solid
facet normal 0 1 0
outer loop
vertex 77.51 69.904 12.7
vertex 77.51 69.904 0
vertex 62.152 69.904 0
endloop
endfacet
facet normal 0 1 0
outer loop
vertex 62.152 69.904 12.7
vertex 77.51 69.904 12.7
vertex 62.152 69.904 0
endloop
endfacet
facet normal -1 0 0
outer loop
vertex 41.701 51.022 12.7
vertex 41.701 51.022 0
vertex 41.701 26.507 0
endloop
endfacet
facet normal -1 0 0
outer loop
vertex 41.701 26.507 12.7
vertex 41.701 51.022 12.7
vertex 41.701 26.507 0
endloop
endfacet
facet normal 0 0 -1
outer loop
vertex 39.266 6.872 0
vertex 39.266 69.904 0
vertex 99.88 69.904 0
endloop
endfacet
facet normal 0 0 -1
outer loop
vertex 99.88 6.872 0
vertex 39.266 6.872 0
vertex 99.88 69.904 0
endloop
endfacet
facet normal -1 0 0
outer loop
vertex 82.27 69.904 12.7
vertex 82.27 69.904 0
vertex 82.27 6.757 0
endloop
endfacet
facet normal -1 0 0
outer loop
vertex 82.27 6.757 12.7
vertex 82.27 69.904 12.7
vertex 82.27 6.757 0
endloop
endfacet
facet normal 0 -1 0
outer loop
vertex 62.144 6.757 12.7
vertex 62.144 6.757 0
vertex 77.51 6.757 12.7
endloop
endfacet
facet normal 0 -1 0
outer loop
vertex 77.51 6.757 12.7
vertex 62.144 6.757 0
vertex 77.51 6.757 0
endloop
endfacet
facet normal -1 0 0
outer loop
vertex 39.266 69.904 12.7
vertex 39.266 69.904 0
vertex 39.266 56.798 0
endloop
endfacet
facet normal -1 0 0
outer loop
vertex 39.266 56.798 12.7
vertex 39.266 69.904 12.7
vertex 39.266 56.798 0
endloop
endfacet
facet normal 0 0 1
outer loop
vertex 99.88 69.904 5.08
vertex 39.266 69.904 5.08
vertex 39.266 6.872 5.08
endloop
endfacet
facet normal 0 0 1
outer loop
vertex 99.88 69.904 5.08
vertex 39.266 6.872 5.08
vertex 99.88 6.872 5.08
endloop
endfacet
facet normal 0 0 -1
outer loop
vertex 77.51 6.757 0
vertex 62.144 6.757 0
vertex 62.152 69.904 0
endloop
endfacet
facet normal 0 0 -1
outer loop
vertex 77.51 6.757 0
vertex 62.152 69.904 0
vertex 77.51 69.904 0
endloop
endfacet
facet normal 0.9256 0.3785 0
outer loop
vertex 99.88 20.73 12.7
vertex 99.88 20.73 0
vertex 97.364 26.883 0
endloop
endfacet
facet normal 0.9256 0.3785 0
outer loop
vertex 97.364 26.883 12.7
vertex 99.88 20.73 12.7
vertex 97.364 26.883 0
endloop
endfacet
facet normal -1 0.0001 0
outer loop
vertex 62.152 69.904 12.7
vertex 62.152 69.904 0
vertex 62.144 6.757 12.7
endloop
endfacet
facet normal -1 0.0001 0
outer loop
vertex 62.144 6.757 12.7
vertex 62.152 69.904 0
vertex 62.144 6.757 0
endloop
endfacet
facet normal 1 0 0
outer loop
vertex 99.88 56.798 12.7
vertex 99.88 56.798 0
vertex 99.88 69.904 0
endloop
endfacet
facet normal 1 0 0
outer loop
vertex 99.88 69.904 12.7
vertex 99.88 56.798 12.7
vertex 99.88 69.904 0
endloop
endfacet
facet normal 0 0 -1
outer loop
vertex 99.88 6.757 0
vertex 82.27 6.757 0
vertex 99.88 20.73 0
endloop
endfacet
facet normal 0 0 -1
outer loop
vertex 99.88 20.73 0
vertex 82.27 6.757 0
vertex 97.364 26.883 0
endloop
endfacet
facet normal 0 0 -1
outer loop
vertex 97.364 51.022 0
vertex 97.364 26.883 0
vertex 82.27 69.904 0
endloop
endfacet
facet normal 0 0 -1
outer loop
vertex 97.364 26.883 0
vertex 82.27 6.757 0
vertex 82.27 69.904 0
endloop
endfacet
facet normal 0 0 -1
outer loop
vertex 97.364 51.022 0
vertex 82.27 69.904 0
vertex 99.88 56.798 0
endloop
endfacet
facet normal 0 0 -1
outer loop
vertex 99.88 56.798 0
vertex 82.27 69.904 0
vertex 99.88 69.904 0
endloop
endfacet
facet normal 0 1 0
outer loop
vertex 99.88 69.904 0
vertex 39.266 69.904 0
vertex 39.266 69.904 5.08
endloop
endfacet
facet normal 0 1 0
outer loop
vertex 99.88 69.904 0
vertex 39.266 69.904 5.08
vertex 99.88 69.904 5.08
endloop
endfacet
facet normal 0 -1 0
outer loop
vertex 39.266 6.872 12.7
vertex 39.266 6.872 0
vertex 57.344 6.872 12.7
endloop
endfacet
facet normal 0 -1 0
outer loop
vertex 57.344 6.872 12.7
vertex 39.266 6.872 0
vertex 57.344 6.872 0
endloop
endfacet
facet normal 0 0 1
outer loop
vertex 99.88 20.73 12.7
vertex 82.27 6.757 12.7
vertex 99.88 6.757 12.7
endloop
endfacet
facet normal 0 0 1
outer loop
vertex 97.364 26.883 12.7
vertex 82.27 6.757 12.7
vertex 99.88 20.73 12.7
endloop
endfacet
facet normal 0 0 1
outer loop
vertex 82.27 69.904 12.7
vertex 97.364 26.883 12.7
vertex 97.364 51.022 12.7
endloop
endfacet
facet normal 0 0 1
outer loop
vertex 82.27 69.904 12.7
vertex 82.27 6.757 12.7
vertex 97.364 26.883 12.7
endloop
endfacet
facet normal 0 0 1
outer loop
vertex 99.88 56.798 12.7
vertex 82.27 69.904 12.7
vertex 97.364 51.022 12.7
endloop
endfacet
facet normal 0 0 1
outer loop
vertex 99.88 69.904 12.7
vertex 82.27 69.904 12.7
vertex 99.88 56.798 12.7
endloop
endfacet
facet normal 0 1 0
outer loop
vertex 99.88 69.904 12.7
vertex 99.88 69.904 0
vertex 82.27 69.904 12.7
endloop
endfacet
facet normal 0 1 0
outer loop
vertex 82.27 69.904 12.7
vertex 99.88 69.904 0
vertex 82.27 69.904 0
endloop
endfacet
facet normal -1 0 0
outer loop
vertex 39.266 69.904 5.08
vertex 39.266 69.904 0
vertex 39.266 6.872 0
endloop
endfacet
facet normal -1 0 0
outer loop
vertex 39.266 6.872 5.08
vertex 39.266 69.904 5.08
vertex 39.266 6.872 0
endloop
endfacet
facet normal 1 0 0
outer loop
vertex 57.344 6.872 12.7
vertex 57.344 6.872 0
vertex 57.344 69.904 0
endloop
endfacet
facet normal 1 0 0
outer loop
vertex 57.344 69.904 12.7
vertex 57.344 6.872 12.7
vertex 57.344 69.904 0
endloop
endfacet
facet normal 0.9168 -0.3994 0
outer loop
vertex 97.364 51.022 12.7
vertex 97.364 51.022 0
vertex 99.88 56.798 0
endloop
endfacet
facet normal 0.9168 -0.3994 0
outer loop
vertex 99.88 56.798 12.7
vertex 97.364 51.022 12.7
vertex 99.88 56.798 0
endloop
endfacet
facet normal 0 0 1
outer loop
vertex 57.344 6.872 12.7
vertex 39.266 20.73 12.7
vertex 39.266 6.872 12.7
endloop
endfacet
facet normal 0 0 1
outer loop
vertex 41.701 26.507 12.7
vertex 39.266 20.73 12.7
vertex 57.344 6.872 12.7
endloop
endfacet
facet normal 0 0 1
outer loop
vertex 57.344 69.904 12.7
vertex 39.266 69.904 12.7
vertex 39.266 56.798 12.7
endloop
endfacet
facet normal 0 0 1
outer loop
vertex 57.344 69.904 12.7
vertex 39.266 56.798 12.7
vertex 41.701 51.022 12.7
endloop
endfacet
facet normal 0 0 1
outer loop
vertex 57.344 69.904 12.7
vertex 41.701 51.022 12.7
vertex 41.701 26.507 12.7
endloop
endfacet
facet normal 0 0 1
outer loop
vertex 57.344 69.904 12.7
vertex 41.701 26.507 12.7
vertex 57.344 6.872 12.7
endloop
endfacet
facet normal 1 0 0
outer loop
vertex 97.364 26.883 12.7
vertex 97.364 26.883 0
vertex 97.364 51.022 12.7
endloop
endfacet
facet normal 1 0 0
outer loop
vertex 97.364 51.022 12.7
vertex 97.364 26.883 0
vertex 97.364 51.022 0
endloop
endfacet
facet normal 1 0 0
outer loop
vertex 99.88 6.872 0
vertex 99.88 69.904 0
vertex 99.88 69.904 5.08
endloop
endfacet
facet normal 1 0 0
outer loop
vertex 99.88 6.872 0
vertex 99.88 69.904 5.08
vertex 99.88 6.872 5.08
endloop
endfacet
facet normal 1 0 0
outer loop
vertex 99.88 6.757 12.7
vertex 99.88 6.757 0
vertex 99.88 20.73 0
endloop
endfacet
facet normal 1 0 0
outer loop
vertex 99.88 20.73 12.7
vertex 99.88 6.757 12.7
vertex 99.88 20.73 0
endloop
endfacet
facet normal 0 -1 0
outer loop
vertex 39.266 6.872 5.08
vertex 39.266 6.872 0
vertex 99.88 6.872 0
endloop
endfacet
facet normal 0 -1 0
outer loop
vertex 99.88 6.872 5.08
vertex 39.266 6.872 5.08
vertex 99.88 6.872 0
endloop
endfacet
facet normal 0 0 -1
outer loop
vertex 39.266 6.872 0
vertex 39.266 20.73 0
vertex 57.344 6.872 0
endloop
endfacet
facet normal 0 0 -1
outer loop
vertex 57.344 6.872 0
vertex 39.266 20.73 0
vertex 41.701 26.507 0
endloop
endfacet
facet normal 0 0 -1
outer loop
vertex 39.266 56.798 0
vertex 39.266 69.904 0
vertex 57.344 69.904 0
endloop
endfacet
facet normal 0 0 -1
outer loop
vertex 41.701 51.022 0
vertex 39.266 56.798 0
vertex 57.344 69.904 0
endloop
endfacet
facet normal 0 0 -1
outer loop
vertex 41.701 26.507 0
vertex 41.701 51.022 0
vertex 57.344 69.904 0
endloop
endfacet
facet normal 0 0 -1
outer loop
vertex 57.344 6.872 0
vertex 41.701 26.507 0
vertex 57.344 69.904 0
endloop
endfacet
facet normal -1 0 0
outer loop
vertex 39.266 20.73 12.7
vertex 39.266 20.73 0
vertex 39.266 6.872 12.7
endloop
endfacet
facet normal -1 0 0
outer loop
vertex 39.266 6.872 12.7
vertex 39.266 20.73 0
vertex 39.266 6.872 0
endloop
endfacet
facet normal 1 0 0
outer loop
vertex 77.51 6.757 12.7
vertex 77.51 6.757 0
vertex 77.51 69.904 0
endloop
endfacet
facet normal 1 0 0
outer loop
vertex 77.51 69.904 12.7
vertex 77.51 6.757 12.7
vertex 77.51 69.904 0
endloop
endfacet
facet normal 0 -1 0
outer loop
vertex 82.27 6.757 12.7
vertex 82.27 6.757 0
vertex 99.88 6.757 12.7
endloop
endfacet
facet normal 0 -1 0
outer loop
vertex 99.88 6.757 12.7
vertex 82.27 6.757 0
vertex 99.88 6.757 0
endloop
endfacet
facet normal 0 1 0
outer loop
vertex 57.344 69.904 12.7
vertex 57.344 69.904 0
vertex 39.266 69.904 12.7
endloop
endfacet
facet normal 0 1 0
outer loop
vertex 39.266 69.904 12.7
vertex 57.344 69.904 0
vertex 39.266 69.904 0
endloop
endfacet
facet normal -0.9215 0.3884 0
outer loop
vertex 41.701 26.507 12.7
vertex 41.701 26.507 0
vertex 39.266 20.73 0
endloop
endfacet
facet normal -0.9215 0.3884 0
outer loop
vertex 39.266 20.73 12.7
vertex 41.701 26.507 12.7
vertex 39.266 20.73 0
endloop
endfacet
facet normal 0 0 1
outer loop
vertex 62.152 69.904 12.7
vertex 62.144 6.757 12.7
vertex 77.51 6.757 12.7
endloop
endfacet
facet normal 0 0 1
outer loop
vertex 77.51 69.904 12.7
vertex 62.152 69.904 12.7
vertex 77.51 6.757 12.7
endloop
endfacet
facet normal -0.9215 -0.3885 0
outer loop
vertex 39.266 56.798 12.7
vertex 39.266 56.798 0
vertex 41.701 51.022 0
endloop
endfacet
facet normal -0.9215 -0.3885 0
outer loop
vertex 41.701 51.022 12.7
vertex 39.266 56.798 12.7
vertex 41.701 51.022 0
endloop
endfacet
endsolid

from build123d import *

# Parameters (mm, degrees)
F1_DEPTH = 12.7
F2_W     = 60.613946
F2_H     = 63.032203
F3_DEPTH = 5.08


with BuildPart() as f1:
    # F0 (on Top) → F1 (new body)
    with BuildSketch(Plane.XY):
        Polygon((57.343874, 69.903992), (39.266109, 69.903992), (39.266109, 56.798093), (41.701067, 51.021639), (41.701067, 26.506934), (39.266109, 20.730481), (39.266109, 6.871789), (57.343874, 6.871789), align=None)
        Polygon((77.509657, 69.903992), (62.152132, 69.903992), (62.144414, 6.756898), (77.509657, 6.756898), align=None)
        Polygon((99.880055, 69.903992), (82.270093, 69.903992), (82.270093, 6.756898), (99.880055, 6.756898), (99.880055, 20.730481), (97.364351, 26.882574), (97.364351, 51.021639), (99.880055, 56.798093), align=None)
    extrude(amount=F1_DEPTH)


with BuildPart() as f3:
    # F2 (on face) → F3 (new body)
    with BuildSketch(Plane(origin=(0, 0, 0), x_dir=(1, 0, 0), z_dir=(0, 0, -1))):
        with Locations((69.573082, -38.38789)):
            Rectangle(F2_W, F2_H)
    extrude(amount=-F3_DEPTH)


solid = Compound([f1.part, f3.part])
